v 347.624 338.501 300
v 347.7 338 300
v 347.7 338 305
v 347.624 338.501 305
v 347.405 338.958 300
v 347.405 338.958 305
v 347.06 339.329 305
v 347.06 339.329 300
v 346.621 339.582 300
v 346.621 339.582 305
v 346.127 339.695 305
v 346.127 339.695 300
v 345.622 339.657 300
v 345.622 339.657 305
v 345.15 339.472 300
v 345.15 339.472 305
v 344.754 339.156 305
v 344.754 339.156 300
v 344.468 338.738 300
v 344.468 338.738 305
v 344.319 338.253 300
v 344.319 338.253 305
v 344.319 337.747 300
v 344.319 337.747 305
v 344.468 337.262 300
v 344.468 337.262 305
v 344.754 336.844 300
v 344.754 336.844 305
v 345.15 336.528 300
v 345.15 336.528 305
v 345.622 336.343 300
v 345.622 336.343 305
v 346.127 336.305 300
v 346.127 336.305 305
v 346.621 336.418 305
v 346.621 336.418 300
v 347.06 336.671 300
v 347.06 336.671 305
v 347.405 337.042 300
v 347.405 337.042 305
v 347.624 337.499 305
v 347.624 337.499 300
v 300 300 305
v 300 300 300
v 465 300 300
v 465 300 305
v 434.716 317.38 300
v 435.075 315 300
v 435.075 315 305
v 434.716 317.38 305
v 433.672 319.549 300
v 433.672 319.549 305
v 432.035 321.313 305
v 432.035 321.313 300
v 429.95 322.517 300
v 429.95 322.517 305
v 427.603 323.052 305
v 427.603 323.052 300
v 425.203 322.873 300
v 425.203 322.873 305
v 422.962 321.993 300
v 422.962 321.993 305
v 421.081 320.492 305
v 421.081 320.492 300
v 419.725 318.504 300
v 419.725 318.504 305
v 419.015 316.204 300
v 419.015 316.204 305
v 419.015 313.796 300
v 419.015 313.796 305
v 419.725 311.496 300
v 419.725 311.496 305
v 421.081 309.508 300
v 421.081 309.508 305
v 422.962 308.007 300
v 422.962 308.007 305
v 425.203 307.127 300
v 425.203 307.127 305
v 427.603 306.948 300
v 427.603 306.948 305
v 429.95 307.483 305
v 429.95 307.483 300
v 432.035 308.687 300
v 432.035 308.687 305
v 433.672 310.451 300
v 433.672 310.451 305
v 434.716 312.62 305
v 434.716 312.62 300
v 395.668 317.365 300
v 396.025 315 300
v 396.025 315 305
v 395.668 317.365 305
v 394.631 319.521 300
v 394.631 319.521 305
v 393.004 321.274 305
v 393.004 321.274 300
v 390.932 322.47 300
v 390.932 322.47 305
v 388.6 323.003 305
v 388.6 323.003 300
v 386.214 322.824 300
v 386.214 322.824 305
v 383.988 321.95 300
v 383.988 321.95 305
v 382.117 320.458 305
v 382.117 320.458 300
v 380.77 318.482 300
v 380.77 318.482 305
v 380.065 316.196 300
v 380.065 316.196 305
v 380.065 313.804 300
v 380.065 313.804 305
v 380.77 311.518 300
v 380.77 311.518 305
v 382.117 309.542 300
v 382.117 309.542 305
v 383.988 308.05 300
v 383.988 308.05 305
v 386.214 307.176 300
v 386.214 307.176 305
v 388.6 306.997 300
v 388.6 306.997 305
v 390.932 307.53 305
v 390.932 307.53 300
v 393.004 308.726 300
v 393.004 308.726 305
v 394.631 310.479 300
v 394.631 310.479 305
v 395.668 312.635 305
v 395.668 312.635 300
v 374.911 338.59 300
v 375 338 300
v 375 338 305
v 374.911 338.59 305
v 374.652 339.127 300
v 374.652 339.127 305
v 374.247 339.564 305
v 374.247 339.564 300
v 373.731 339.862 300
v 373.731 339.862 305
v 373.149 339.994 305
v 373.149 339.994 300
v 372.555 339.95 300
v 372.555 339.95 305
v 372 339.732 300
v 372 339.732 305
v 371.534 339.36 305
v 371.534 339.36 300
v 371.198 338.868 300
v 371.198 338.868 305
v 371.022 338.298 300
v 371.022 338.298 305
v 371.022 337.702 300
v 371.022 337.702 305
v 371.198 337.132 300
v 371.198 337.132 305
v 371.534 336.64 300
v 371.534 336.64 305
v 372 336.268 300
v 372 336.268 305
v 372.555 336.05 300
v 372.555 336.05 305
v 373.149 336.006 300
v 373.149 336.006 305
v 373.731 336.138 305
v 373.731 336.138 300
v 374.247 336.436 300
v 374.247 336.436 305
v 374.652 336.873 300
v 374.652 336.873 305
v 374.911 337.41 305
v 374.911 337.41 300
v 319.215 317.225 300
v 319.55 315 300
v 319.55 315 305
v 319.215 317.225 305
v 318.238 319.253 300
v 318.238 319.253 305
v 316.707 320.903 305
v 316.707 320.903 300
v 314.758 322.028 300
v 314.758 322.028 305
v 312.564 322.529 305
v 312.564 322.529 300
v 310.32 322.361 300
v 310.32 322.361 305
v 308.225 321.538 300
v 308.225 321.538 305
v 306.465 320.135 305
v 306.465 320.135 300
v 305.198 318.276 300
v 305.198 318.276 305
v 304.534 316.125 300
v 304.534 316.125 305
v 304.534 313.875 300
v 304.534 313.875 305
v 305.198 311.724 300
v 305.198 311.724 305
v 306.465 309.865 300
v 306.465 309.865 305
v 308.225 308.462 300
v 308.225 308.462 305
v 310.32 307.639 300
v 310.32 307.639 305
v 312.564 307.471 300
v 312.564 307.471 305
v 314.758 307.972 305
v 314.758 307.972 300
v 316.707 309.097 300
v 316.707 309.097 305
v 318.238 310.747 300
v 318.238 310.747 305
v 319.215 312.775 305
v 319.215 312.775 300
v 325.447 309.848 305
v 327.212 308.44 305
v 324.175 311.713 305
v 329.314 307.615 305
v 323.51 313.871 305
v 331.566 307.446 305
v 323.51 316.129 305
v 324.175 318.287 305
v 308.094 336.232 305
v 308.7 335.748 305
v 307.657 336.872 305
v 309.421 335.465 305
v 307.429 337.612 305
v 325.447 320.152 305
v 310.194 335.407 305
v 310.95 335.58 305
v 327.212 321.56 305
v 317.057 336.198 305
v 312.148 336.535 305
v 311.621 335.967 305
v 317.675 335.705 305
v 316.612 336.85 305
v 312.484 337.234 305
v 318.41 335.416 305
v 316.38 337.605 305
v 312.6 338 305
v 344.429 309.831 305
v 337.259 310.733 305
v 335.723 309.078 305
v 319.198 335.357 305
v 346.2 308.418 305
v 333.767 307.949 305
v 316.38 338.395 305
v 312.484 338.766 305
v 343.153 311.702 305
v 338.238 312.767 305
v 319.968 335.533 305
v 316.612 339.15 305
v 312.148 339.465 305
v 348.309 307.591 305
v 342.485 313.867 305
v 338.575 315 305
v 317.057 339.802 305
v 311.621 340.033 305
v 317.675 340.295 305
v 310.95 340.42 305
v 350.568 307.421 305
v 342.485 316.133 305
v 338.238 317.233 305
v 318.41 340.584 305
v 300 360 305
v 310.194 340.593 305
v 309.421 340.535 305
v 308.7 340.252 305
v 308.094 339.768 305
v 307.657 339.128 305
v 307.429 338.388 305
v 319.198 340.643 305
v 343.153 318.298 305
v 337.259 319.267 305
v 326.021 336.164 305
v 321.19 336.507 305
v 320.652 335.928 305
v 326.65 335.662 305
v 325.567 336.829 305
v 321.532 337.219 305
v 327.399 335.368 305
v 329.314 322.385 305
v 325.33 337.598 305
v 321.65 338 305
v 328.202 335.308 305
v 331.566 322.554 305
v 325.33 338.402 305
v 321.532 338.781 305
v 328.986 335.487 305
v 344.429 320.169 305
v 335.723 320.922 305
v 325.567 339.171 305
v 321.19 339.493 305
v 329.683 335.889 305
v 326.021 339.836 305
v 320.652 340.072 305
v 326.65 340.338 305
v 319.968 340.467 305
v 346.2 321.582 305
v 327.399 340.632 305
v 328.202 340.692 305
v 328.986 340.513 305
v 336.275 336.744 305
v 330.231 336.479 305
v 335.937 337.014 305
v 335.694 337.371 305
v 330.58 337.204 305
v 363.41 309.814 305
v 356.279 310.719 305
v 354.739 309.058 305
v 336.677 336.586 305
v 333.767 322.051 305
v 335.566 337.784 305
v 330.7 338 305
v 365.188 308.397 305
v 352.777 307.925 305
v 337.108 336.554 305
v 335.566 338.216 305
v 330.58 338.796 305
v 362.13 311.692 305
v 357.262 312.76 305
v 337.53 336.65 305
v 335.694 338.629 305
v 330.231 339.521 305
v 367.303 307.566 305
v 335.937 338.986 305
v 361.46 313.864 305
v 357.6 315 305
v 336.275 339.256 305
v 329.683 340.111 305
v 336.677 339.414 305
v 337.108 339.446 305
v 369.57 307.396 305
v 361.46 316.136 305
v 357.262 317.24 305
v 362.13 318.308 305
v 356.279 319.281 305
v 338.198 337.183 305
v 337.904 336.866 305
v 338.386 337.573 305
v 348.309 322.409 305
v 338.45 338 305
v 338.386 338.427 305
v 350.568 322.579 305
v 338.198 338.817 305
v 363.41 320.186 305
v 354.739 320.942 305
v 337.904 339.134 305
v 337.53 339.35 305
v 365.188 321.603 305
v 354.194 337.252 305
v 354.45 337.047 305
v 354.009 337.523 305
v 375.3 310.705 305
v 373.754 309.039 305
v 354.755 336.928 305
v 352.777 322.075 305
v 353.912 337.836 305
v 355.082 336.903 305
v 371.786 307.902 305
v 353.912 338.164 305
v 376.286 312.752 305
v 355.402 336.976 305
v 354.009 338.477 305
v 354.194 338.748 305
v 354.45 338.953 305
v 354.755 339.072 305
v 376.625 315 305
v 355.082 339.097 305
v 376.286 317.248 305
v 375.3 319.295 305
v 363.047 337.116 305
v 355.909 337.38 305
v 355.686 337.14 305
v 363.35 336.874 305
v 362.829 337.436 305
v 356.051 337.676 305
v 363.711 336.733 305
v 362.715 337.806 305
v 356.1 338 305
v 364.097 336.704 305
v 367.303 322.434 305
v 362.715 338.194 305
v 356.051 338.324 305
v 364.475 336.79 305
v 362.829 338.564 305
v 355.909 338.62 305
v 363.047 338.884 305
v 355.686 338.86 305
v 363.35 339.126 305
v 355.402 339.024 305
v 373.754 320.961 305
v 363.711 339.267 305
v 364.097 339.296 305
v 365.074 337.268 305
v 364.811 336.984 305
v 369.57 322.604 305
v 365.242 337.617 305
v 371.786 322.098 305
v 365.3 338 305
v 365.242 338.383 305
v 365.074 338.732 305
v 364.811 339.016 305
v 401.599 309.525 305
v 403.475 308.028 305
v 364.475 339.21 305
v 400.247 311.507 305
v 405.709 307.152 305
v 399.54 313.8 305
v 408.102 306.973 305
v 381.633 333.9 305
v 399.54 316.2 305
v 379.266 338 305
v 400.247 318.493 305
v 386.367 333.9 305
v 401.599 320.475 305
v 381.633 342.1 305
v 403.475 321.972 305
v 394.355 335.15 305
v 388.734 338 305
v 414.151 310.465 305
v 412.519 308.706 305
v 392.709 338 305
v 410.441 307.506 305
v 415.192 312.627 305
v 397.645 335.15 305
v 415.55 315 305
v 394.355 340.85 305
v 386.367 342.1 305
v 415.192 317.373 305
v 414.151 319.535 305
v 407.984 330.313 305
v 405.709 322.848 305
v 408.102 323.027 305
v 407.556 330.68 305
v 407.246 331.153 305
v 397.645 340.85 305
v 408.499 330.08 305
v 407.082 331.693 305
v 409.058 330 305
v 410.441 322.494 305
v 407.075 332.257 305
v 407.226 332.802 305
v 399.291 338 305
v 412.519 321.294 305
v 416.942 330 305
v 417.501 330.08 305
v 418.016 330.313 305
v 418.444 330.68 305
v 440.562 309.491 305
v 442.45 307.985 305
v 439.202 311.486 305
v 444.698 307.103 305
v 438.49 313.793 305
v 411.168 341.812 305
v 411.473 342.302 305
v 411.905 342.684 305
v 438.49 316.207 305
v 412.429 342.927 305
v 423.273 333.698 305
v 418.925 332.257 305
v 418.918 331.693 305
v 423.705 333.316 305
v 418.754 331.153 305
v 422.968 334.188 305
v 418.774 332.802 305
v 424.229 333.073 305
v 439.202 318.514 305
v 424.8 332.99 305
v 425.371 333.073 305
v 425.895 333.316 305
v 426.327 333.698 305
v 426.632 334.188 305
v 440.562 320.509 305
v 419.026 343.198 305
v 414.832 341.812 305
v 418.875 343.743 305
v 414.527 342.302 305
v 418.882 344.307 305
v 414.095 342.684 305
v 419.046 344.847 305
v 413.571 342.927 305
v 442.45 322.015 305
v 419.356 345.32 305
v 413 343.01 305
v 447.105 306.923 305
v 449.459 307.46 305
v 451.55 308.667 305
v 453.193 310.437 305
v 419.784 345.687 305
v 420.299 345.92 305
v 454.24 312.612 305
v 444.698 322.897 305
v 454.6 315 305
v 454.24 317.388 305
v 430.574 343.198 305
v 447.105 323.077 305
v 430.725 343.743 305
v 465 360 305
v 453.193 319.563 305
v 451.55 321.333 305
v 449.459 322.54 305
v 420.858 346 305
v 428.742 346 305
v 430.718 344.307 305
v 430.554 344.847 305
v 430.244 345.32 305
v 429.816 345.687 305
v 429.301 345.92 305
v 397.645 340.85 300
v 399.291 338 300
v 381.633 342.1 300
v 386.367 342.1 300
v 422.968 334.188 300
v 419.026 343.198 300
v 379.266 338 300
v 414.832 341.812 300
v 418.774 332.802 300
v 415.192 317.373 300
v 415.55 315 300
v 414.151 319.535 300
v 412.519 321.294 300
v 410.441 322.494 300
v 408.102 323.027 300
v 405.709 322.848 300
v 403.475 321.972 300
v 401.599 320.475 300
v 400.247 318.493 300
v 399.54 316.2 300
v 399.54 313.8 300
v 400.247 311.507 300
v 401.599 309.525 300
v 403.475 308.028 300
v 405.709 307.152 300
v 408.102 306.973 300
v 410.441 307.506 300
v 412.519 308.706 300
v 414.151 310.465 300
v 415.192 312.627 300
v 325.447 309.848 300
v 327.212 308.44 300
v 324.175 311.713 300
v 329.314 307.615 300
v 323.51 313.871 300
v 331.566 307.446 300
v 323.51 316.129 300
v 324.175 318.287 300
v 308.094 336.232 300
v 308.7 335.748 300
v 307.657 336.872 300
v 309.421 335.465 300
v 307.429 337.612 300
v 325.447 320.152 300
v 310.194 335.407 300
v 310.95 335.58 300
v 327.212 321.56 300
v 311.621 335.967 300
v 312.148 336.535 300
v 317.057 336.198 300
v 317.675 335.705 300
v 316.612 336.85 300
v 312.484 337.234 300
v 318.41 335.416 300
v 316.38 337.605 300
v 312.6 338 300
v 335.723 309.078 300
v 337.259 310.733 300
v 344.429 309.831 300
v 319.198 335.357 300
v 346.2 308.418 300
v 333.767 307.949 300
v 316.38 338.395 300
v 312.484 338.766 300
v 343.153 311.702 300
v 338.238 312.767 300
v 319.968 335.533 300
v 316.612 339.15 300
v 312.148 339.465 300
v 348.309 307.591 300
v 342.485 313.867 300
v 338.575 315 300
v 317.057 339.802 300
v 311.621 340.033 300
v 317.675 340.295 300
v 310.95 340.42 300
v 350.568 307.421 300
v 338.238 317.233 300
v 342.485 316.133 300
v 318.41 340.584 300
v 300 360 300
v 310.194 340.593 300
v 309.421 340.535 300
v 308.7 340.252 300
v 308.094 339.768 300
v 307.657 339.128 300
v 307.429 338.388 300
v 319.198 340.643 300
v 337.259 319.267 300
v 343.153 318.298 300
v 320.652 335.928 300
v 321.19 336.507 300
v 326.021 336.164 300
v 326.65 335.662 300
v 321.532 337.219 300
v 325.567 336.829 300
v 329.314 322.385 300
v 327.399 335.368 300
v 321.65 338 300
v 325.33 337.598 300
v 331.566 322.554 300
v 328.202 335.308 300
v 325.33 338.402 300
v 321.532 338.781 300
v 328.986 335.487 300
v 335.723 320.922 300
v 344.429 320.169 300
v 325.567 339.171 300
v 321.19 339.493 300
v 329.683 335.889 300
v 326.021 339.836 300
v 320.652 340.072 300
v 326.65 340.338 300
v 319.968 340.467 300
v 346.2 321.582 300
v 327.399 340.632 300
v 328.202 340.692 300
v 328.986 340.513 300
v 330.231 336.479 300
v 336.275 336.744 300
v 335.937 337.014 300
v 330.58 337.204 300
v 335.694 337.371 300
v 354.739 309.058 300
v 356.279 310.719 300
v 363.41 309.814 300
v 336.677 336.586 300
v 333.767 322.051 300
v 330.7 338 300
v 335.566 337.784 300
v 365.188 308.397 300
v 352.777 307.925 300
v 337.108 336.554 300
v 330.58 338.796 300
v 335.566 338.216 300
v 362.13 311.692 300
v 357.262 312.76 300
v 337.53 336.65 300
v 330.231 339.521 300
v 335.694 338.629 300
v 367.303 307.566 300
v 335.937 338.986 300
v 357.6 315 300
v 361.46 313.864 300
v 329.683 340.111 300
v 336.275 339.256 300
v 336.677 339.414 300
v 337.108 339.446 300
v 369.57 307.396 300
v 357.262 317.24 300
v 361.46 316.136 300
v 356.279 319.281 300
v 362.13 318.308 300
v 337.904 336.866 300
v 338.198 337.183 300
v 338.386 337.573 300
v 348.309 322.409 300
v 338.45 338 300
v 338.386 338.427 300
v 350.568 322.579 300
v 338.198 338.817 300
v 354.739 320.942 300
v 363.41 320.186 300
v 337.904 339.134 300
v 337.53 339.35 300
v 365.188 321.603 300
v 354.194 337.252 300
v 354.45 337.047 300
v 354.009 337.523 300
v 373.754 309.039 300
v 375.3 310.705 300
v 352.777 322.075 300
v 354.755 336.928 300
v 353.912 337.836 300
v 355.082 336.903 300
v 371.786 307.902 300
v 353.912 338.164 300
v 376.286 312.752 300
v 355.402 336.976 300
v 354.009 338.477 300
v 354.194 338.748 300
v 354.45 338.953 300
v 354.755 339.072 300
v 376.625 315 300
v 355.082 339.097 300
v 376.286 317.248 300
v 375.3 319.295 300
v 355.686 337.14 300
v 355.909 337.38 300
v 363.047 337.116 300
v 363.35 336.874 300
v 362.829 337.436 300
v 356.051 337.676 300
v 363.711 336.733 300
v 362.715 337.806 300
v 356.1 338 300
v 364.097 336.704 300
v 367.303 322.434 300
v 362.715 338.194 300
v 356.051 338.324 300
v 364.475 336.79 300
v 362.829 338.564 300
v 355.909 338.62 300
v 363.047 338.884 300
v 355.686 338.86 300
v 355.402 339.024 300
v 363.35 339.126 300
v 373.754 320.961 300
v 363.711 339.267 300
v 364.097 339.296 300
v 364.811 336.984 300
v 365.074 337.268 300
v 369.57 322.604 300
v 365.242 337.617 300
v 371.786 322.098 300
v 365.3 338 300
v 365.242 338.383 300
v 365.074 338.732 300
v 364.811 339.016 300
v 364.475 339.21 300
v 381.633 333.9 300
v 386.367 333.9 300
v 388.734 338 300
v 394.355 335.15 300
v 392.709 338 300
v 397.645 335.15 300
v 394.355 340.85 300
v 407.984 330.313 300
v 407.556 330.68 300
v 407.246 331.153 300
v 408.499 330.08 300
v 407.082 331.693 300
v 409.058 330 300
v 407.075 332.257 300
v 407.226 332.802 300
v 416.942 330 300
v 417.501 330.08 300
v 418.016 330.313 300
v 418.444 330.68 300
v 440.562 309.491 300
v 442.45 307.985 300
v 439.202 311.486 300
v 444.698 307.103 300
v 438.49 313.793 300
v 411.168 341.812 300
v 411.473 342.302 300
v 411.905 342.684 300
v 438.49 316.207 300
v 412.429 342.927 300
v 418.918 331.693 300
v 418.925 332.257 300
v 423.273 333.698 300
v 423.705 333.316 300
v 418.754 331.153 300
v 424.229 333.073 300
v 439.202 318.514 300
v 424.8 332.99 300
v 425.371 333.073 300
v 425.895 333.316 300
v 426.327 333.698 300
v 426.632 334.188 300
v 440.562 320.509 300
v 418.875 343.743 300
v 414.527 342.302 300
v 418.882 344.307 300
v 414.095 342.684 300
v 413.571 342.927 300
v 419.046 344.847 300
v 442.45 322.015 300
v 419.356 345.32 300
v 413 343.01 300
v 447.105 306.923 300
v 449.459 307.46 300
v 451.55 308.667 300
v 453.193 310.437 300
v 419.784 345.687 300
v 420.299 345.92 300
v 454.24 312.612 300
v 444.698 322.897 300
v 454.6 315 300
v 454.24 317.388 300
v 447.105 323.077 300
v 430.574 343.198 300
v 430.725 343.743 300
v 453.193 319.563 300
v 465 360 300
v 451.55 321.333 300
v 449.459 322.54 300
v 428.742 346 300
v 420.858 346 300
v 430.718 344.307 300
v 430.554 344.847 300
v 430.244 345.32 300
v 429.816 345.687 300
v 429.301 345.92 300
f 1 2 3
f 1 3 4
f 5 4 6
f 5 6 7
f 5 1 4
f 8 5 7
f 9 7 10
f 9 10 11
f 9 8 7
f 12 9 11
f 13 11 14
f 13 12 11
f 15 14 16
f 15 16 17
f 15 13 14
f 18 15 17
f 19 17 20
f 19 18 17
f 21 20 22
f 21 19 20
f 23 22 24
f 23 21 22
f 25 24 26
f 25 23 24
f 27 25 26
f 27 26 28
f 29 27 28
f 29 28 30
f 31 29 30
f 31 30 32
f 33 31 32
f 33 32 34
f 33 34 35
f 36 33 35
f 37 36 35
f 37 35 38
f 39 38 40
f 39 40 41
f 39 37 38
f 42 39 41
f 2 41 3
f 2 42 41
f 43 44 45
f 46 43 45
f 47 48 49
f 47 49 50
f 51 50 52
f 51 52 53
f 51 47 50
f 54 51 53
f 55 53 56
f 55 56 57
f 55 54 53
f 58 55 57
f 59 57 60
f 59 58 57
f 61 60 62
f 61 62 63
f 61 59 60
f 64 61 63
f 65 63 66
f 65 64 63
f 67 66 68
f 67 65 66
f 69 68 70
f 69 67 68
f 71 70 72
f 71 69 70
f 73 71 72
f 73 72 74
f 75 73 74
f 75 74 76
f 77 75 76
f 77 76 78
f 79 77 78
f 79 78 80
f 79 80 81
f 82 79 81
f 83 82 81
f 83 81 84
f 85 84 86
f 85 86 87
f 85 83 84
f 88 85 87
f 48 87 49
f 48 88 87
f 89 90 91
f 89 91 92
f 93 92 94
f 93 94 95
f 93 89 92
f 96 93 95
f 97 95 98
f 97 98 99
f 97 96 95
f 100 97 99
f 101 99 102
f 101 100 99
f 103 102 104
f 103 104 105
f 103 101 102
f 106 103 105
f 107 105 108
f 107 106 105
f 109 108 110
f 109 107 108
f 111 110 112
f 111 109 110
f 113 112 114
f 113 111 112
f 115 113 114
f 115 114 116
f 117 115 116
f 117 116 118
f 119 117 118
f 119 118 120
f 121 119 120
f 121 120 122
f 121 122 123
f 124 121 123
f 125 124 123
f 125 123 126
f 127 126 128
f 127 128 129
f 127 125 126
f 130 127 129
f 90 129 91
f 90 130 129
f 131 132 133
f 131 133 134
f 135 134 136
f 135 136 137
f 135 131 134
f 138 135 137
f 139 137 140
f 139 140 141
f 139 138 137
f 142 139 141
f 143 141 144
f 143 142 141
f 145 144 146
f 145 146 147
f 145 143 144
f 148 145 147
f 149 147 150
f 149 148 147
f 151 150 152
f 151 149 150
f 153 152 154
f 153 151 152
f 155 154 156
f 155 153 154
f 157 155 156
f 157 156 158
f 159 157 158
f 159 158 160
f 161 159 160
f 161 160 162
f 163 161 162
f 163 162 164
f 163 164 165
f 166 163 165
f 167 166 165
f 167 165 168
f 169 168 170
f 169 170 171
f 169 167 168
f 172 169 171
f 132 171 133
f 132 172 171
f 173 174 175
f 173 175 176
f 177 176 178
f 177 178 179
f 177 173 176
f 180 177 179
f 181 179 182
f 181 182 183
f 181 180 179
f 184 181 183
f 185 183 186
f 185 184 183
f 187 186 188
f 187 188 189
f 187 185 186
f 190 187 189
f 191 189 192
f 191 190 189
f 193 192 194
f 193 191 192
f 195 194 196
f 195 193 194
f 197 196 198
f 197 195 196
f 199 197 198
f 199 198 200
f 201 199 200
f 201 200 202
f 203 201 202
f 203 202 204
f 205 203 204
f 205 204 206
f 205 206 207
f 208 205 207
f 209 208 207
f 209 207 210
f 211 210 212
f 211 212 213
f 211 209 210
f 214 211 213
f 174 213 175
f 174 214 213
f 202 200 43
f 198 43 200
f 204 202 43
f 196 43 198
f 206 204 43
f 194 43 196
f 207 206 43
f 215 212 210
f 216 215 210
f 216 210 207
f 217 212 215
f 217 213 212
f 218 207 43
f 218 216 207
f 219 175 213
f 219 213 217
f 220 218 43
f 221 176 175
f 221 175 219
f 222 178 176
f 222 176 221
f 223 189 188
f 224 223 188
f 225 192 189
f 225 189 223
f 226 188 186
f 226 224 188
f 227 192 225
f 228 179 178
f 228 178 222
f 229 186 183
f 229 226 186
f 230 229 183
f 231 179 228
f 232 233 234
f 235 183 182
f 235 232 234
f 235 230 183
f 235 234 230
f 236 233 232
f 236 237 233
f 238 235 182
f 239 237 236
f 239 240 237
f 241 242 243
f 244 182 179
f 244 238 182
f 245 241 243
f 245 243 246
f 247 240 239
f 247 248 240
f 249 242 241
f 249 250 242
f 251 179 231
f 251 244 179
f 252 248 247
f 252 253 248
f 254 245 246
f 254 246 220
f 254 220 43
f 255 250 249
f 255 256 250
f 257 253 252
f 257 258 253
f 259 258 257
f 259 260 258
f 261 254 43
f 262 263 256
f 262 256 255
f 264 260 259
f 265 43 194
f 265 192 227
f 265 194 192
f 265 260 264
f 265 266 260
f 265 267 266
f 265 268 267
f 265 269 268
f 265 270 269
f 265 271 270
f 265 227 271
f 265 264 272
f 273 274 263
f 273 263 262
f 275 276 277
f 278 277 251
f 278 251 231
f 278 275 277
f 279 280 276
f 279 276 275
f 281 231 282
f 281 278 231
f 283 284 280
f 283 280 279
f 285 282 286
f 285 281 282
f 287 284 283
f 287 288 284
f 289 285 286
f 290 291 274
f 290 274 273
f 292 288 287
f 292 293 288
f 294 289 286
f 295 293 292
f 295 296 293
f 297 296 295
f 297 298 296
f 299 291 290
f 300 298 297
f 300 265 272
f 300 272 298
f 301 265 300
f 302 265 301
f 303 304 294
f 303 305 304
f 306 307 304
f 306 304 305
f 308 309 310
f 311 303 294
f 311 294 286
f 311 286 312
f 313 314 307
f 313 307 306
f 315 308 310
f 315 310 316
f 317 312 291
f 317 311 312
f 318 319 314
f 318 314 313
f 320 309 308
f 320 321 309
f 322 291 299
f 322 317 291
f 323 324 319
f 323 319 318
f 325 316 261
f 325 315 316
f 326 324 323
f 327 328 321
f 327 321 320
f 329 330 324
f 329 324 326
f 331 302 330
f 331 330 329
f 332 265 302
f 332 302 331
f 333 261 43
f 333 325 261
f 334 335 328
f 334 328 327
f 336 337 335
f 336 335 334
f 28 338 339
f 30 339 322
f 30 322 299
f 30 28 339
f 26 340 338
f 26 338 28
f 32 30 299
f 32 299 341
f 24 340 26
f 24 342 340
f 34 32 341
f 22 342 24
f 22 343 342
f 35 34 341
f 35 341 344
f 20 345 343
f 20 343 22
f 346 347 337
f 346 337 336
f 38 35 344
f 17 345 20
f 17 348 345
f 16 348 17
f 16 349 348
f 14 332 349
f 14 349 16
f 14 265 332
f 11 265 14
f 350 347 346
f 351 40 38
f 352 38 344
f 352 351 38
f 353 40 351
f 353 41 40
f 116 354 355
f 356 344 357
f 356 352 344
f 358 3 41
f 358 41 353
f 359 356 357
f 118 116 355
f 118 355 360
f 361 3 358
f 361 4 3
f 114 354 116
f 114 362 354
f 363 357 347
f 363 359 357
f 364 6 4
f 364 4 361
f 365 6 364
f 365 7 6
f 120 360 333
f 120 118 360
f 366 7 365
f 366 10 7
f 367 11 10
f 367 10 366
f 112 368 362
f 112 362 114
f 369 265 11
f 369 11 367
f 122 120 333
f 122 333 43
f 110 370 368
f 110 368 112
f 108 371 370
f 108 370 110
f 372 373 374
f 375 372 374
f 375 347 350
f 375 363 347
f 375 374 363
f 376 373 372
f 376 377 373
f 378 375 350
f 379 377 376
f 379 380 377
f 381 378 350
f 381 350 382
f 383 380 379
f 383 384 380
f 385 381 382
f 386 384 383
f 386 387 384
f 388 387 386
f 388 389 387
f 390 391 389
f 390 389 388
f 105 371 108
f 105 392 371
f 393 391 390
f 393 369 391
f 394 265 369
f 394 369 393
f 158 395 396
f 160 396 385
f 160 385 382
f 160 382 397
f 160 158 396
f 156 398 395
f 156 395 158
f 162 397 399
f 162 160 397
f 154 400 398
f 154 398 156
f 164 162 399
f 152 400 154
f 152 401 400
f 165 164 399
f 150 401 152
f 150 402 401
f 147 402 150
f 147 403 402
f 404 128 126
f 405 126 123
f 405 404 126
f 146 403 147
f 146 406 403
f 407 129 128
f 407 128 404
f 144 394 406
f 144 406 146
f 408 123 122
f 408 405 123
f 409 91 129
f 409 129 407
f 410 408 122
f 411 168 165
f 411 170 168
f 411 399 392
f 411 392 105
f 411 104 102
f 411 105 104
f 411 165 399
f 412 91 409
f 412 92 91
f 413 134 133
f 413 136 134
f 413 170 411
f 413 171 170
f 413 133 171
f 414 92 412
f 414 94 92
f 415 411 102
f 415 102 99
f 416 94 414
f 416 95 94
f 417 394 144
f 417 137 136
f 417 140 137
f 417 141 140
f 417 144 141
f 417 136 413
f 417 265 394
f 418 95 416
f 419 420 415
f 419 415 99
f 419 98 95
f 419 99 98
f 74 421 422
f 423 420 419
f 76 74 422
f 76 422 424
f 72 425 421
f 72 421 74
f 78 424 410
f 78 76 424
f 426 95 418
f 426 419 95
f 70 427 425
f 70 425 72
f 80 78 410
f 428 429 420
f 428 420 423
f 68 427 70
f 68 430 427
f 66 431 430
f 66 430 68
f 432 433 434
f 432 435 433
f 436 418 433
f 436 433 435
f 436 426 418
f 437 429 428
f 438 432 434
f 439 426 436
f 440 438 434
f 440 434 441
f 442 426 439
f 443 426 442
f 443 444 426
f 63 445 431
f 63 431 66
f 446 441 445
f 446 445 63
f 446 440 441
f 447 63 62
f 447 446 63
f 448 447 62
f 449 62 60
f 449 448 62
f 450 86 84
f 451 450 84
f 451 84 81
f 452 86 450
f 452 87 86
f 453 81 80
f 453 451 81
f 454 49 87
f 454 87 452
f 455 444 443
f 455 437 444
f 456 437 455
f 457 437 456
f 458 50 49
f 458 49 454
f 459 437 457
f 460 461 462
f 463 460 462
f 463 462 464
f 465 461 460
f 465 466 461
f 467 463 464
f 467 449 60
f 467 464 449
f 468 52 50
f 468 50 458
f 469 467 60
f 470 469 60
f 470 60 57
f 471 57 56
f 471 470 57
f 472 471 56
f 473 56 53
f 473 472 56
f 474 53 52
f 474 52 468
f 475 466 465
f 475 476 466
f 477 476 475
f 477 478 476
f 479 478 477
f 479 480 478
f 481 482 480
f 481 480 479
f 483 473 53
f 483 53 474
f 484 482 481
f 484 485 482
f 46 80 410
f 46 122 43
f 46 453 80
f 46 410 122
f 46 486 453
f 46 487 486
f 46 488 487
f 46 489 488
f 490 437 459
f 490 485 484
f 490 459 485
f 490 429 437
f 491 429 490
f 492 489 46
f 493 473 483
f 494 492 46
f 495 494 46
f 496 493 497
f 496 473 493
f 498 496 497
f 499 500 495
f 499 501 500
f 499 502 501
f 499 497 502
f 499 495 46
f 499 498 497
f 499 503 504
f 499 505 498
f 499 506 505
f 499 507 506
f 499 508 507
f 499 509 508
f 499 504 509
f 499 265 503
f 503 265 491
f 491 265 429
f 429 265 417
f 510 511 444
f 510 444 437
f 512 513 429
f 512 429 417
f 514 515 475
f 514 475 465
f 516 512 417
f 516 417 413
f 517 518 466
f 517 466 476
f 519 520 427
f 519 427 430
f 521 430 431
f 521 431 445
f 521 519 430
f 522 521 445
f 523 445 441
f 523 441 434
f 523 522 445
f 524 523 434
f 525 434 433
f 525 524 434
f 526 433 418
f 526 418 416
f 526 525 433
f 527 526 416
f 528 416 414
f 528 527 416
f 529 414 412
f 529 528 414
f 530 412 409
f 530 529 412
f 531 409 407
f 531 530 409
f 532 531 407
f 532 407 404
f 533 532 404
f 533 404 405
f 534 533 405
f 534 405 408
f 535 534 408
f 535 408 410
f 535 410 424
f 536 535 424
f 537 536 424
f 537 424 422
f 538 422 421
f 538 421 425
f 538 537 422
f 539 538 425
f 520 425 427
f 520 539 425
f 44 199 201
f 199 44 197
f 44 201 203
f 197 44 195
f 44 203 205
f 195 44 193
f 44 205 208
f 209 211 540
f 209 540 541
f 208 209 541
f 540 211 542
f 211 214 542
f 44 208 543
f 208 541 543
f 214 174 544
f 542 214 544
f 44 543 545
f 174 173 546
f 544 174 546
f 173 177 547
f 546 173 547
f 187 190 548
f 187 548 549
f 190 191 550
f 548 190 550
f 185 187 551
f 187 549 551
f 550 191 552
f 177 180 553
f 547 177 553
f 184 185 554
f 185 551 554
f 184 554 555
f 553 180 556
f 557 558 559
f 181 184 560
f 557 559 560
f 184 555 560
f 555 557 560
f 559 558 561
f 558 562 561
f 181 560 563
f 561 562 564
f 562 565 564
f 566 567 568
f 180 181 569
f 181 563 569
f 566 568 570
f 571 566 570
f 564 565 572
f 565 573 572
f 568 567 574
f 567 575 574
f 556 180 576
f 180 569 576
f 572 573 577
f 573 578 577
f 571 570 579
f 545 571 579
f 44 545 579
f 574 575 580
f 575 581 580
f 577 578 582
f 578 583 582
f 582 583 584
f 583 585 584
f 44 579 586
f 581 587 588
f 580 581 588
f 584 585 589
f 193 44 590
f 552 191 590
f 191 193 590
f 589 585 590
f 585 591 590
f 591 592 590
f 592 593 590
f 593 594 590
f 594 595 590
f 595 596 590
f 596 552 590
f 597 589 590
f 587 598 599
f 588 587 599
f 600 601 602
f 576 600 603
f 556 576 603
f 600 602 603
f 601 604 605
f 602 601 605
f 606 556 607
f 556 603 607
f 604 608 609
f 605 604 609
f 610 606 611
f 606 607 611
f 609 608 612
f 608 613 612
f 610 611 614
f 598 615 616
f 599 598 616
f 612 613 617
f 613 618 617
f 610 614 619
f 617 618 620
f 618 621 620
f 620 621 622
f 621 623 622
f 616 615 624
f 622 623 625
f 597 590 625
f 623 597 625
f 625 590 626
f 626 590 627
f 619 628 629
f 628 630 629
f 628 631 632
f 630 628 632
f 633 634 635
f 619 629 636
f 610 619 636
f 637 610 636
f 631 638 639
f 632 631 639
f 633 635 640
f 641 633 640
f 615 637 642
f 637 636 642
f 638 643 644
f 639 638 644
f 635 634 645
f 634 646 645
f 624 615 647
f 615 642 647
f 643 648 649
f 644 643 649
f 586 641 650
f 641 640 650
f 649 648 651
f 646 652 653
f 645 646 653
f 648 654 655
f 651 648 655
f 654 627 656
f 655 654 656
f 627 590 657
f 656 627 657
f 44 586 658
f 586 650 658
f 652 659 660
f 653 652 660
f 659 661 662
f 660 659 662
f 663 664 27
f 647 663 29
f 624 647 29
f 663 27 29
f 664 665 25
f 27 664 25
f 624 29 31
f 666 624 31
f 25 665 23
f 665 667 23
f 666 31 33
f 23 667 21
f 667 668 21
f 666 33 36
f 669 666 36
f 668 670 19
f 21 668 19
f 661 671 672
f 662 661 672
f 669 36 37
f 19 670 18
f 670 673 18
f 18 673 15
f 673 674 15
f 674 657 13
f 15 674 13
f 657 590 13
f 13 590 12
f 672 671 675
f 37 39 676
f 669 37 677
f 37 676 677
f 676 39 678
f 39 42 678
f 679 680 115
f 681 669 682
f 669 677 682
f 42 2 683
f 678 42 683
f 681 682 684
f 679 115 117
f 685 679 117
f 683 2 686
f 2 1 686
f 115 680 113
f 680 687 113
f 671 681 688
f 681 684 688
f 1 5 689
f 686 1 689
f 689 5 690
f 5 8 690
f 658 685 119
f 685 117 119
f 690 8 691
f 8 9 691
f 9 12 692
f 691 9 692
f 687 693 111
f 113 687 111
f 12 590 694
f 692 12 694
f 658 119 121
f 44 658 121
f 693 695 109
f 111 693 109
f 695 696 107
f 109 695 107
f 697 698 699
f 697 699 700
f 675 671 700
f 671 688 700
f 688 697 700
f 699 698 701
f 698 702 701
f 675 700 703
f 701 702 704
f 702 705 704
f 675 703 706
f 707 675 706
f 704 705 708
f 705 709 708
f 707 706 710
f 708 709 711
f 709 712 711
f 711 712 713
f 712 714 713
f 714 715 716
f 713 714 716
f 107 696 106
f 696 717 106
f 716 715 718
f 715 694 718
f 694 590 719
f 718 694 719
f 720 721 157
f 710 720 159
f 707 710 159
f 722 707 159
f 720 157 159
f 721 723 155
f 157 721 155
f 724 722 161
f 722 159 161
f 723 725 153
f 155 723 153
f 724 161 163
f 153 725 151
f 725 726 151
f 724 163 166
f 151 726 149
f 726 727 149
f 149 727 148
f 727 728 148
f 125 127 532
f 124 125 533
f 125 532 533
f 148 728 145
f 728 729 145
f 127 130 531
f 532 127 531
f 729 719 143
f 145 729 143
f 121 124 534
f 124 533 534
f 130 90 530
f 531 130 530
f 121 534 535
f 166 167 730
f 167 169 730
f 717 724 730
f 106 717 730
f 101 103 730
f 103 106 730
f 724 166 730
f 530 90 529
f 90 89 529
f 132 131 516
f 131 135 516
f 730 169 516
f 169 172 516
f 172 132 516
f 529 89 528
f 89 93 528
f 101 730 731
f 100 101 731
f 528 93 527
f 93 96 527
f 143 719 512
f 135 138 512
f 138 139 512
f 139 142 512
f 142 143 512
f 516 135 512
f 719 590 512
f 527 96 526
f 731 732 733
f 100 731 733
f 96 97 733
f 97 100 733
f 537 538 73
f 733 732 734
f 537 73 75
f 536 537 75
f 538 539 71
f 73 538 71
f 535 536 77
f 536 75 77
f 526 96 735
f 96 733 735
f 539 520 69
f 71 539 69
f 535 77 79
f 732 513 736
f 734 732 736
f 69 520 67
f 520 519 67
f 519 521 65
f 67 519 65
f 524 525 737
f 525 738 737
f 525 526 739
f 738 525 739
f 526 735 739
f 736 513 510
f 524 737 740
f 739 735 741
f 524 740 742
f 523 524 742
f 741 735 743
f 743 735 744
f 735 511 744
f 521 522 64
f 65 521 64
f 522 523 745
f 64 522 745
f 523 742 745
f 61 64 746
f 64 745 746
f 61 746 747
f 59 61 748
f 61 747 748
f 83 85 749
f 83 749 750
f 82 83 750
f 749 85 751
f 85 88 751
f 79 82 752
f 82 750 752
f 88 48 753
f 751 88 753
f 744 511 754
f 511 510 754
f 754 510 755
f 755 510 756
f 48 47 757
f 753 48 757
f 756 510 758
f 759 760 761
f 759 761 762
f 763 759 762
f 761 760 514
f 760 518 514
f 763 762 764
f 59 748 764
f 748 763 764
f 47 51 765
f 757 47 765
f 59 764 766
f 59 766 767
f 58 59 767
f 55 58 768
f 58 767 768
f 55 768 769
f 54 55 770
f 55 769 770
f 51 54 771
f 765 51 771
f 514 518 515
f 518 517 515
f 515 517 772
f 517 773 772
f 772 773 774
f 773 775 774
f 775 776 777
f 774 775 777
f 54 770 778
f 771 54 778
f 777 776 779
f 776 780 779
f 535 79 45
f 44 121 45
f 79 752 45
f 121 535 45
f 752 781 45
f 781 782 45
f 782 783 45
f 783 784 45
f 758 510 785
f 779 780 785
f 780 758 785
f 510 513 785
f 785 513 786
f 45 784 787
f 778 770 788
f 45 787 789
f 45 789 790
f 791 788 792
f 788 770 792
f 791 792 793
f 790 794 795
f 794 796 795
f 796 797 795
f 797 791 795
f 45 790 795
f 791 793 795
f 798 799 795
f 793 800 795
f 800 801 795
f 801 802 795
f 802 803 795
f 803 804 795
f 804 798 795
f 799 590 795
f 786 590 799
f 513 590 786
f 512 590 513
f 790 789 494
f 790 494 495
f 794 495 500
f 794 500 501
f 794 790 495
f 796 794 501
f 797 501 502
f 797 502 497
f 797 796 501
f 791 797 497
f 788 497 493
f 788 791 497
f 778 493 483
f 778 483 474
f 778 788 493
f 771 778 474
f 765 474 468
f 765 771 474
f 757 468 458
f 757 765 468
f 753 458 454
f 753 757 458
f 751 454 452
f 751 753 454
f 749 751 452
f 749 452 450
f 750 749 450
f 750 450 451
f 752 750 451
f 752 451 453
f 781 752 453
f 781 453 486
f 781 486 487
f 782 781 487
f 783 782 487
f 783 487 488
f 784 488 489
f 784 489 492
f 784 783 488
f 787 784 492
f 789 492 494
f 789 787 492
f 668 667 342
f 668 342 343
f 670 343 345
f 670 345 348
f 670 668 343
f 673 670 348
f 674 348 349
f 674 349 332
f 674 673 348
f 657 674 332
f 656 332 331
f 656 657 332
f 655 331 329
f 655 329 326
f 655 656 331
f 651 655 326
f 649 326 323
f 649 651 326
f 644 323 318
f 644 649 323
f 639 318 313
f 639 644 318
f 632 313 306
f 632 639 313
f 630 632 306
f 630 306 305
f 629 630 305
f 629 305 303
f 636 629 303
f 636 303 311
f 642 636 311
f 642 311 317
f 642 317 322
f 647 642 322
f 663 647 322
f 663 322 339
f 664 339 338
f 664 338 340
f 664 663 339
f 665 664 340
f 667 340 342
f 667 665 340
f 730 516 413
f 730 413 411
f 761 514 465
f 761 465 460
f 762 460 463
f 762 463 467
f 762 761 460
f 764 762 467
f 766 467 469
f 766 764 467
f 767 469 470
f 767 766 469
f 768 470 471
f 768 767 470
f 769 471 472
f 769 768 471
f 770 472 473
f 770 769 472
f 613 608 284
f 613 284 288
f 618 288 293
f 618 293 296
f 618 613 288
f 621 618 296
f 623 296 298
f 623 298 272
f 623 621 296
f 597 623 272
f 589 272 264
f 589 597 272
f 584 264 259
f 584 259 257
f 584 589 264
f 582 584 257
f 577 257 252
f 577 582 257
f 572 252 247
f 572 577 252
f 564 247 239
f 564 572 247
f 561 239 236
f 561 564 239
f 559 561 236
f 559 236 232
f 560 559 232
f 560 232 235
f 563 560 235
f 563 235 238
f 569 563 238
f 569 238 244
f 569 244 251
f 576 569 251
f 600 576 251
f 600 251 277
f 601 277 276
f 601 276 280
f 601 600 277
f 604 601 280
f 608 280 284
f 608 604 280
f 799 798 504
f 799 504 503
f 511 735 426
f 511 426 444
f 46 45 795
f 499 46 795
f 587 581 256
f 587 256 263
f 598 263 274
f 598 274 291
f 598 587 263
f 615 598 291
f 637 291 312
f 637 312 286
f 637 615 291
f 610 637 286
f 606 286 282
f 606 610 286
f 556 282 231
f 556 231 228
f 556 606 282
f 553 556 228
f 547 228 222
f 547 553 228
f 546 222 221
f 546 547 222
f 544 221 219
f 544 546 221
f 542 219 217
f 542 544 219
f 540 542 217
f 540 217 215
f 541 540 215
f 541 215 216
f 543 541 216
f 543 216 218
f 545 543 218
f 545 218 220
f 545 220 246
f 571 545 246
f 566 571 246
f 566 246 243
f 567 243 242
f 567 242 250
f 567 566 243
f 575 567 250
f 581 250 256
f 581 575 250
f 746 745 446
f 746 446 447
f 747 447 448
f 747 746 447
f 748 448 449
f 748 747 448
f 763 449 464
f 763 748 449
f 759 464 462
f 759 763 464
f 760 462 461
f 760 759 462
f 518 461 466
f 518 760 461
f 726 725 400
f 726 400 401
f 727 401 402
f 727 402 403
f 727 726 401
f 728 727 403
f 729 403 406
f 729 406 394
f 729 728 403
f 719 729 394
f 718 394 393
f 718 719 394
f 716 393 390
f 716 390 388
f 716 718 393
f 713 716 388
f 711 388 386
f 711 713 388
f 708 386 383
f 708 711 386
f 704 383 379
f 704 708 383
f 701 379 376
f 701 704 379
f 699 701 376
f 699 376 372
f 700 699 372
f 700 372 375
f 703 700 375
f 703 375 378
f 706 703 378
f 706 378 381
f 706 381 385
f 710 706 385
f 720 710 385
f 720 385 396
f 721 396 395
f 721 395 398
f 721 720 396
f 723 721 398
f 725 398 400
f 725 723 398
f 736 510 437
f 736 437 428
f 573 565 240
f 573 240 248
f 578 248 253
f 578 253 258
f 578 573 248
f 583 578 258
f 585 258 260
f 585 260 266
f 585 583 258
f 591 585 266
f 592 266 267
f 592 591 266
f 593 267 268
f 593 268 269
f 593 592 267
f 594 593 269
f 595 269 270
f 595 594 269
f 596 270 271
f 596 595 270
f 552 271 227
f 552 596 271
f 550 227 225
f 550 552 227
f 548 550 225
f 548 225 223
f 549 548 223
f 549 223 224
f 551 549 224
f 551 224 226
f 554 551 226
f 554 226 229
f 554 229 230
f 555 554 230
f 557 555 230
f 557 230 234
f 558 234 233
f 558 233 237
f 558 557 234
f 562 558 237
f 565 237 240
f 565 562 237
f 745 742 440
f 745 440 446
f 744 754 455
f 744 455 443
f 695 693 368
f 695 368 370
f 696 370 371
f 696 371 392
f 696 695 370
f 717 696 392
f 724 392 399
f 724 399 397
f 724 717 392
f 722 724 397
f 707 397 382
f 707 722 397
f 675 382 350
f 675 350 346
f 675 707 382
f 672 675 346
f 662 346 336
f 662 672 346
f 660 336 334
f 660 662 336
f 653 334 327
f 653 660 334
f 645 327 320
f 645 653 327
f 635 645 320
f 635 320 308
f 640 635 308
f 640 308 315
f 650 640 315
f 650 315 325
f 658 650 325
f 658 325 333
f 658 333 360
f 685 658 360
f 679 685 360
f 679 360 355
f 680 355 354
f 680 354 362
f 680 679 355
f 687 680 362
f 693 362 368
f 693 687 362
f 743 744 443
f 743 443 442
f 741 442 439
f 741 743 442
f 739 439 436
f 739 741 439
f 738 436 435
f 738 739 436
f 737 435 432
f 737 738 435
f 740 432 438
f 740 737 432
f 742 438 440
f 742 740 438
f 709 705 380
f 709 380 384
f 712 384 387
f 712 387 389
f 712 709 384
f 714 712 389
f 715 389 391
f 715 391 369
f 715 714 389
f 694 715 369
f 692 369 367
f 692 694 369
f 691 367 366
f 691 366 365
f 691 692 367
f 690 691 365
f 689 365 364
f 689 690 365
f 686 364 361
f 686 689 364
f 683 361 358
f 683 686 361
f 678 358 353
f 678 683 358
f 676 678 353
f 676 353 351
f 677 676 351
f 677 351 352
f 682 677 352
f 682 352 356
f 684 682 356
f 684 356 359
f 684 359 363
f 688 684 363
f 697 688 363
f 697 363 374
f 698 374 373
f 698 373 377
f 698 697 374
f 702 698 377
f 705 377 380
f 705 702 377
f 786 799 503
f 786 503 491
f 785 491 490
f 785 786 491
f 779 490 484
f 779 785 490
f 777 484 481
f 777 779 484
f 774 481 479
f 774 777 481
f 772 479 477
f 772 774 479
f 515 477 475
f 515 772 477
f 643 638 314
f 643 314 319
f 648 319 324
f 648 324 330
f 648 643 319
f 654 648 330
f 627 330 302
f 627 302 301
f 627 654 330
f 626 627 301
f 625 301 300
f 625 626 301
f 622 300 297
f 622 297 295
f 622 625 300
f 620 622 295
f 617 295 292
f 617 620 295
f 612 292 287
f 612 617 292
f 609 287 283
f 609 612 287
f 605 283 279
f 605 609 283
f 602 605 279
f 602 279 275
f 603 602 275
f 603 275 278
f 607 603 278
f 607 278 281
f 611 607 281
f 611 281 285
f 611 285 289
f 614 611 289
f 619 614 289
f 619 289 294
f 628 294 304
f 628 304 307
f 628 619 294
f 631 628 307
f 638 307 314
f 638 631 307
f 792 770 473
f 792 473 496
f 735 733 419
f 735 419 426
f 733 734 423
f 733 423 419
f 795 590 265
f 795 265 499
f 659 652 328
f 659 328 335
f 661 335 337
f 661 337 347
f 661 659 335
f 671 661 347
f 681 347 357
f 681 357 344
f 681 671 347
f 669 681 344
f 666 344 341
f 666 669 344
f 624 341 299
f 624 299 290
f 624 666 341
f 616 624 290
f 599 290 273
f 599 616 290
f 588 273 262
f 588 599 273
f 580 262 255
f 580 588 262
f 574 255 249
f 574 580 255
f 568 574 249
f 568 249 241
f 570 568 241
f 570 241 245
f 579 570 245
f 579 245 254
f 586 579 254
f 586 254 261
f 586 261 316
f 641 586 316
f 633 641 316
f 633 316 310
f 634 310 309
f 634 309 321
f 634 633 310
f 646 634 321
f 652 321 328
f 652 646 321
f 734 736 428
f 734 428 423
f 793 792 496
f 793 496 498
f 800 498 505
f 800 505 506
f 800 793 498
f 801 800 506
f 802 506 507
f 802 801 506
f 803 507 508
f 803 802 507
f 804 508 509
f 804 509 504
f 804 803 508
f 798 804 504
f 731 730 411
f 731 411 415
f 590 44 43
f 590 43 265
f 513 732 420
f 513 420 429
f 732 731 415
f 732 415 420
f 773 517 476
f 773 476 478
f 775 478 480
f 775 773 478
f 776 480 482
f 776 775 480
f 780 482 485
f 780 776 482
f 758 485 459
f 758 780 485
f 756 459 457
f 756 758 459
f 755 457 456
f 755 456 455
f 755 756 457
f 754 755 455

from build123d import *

# Parameters (mm, degrees)
SKETCH1_W           = 165
SKETCH1_H           = 60
SKETCH1_R           = 7.55
SKETCH1_R_2         = 7.575
SKETCH1_R_3         = 7.6
SKETCH1_R_4         = 7.625
SKETCH1_R_5         = 8.025
SKETCH1_R_6         = 8.05
SKETCH1_R_7         = 8.075
SKETCH1_R_8         = 8.1
SKETCH1_R_9         = 2.6
SKETCH1_R_10        = 2.65
SKETCH1_R_11        = 2.7
SKETCH1_R_12        = 1.45
SKETCH1_R_13        = 1.7
SKETCH1_R_14        = 1.1
SKETCH1_R_15        = 1.3
SKETCH1_R_16        = 2
BOSS_EXTRUDE1_DEPTH = 5


with BuildPart() as part:
    # Sketch1 → Boss-Extrude1 (new body)
    with BuildSketch(Plane.XY.offset(300)):
        with Locations((382.5, 330)):
            Rectangle(SKETCH1_W, SKETCH1_H)
        with Locations((312, 315)):
            Circle(SKETCH1_R, mode=Mode.SUBTRACT)
        with Locations((331, 315)):
            Circle(SKETCH1_R_2, mode=Mode.SUBTRACT)
        with Locations((350, 315)):
            Circle(SKETCH1_R_3, mode=Mode.SUBTRACT)
        with Locations((369, 315)):
            Circle(SKETCH1_R_4, mode=Mode.SUBTRACT)
        with Locations((388, 315)):
            Circle(SKETCH1_R_5, mode=Mode.SUBTRACT)
        with Locations((407.5, 315)):
            Circle(SKETCH1_R_6, mode=Mode.SUBTRACT)
        with Locations((427, 315)):
            Circle(SKETCH1_R_7, mode=Mode.SUBTRACT)
        with Locations((446.5, 315)):
            Circle(SKETCH1_R_8, mode=Mode.SUBTRACT)
        with Locations((310, 338)):
            Circle(SKETCH1_R_9, mode=Mode.SUBTRACT)
        with Locations((319, 338)):
            Circle(SKETCH1_R_10, mode=Mode.SUBTRACT)
        with Locations((328, 338)):
            Circle(SKETCH1_R_11, mode=Mode.SUBTRACT)
        with Locations((337, 338)):
            Circle(SKETCH1_R_12, mode=Mode.SUBTRACT)
        with Locations((346, 338)):
            Circle(SKETCH1_R_13, mode=Mode.SUBTRACT)
        with Locations((355, 338)):
            Circle(SKETCH1_R_14, mode=Mode.SUBTRACT)
        with Locations((364, 338)):
            Circle(SKETCH1_R_15, mode=Mode.SUBTRACT)
        with Locations((373, 338)):
            Circle(SKETCH1_R_16, mode=Mode.SUBTRACT)
        Polygon((388.734272207, 338), (386.367136104, 342.1), (381.632863896, 342.1), (379.265727793, 338), (381.632863896, 333.9), (386.367136104, 333.9), align=None, mode=Mode.SUBTRACT)
        Polygon((399.290896534, 338), (397.645448267, 340.85), (394.354551733, 340.85), (392.709103466, 338), (394.354551733, 335.15), (397.645448267, 335.15), align=None, mode=Mode.SUBTRACT)
        with BuildLine():
            Line((409.05803115, 330), (416.94196885, 330))
            ThreePointArc((416.94196885, 330), (418.615778179, 330.90530263), (418.77428352, 332.801637668))
            Line((418.77428352, 332.801637668), (414.83231467, 341.811852183))
            ThreePointArc((414.83231467, 341.811852183), (413, 343.010214515), (411.16768533, 341.811852183))
            Line((411.16768533, 341.811852183), (407.22571648, 332.801637668))
            ThreePointArc((407.22571648, 332.801637668), (407.384221821, 330.90530263), (409.05803115, 330))
        make_face(mode=Mode.SUBTRACT)
        with BuildLine():
            Line((426.63231467, 334.188147817), (430.57428352, 343.198362332))
            ThreePointArc((430.57428352, 343.198362332), (430.415778179, 345.09469737), (428.74196885, 346))
            Line((428.74196885, 346), (420.85803115, 346))
            ThreePointArc((420.85803115, 346), (419.184221821, 345.09469737), (419.02571648, 343.198362332))
            Line((419.02571648, 343.198362332), (422.96768533, 334.188147817))
            ThreePointArc((422.96768533, 334.188147817), (424.8, 332.989785485), (426.63231467, 334.188147817))
        make_face(mode=Mode.SUBTRACT)
    extrude(amount=BOSS_EXTRUDE1_DEPTH)


solid = part.part
